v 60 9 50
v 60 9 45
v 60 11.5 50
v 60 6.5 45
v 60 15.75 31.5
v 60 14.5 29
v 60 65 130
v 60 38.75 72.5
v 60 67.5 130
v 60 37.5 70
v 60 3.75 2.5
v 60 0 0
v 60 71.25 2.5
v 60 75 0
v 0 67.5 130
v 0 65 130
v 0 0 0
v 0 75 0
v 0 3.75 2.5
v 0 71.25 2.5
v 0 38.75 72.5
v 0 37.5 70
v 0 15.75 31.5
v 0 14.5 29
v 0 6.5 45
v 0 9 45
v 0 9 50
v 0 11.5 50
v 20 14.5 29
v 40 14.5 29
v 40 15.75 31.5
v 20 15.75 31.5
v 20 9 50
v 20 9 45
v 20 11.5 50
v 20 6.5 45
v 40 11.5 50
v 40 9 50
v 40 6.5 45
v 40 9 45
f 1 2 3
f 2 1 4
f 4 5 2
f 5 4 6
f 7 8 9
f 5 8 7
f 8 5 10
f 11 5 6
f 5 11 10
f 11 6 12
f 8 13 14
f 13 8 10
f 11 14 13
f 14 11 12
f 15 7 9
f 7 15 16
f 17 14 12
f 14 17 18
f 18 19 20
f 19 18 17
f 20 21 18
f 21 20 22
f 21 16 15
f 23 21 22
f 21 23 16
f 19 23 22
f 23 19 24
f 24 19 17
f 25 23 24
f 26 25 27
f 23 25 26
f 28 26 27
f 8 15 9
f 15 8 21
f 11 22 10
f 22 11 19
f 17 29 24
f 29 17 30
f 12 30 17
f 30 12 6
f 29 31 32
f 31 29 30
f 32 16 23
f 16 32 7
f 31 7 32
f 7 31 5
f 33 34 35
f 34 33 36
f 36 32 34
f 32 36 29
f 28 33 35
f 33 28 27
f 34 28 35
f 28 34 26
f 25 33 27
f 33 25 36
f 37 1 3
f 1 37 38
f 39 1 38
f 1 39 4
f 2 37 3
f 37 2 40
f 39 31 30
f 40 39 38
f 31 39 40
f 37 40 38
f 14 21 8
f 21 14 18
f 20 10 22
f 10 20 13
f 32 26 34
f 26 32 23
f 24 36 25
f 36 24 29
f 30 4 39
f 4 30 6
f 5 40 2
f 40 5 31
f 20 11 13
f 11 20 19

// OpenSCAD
/* [Dimensions] */
// Thickness of the stand parts thicker is stronger but increases print itme.
t = 2.5;
// Overall width of the stand. Adjust for your phone.
w = 60;
// Depth of the stand base. Stops the sand toppling backwards.
d = 75;
// Overall Height of the stand. May want increasing for phablets.
h = 130;
// Height of the phone support fingers from the base
sup = 45;
// Width of the gap between the phone support fingers.
gap = 20;
// Depth of the phone support fingers. Adjust for your phone + case
sd = 16;
// Height of the phone supprt fingers up the phone front.
sh = 5;

sw = (w - gap) / 2;

sheer = 0.5;

sheerMatrix1 = [
    [1, 0, 0, 0],
    [0, 1, sheer, 0, 0],
    [0, 0, 1, 0]
    ];
    
sheerMatrix2 = [
    [1, 0, 0, 0],
    [0, 1, -sheer, 0, 0],
    [0, 0, 1, 0]
    ];
    
union() {
    // The bottom
    translate([0, t, 0]) cube([w, d - 2*t, t]);
    
    multmatrix(m = sheerMatrix1) union() {
        // The back
        cube([w, t, h]);
        // Left finger top
        translate([0, -sd, sup]) cube([sw, t, sh]);
        // Right finger top
        translate([w, -sd, sup]) mirror([1,0,0]) cube([sw, t, sh]);
    }
    multmatrix(m = sheerMatrix2) union() {
        
        // The support 
        translate([0, d - t, 0]) cube([w, t, d - t]);
        // Left finger bottom
        translate([0, sup - sd, sup - sd]) cube([sw, t, sd]);
        // Right finger bottom
        translate([w, sup - sd, sup - sd]) mirror([1,0,0]) cube([sw, t, sd]);
    }
}
